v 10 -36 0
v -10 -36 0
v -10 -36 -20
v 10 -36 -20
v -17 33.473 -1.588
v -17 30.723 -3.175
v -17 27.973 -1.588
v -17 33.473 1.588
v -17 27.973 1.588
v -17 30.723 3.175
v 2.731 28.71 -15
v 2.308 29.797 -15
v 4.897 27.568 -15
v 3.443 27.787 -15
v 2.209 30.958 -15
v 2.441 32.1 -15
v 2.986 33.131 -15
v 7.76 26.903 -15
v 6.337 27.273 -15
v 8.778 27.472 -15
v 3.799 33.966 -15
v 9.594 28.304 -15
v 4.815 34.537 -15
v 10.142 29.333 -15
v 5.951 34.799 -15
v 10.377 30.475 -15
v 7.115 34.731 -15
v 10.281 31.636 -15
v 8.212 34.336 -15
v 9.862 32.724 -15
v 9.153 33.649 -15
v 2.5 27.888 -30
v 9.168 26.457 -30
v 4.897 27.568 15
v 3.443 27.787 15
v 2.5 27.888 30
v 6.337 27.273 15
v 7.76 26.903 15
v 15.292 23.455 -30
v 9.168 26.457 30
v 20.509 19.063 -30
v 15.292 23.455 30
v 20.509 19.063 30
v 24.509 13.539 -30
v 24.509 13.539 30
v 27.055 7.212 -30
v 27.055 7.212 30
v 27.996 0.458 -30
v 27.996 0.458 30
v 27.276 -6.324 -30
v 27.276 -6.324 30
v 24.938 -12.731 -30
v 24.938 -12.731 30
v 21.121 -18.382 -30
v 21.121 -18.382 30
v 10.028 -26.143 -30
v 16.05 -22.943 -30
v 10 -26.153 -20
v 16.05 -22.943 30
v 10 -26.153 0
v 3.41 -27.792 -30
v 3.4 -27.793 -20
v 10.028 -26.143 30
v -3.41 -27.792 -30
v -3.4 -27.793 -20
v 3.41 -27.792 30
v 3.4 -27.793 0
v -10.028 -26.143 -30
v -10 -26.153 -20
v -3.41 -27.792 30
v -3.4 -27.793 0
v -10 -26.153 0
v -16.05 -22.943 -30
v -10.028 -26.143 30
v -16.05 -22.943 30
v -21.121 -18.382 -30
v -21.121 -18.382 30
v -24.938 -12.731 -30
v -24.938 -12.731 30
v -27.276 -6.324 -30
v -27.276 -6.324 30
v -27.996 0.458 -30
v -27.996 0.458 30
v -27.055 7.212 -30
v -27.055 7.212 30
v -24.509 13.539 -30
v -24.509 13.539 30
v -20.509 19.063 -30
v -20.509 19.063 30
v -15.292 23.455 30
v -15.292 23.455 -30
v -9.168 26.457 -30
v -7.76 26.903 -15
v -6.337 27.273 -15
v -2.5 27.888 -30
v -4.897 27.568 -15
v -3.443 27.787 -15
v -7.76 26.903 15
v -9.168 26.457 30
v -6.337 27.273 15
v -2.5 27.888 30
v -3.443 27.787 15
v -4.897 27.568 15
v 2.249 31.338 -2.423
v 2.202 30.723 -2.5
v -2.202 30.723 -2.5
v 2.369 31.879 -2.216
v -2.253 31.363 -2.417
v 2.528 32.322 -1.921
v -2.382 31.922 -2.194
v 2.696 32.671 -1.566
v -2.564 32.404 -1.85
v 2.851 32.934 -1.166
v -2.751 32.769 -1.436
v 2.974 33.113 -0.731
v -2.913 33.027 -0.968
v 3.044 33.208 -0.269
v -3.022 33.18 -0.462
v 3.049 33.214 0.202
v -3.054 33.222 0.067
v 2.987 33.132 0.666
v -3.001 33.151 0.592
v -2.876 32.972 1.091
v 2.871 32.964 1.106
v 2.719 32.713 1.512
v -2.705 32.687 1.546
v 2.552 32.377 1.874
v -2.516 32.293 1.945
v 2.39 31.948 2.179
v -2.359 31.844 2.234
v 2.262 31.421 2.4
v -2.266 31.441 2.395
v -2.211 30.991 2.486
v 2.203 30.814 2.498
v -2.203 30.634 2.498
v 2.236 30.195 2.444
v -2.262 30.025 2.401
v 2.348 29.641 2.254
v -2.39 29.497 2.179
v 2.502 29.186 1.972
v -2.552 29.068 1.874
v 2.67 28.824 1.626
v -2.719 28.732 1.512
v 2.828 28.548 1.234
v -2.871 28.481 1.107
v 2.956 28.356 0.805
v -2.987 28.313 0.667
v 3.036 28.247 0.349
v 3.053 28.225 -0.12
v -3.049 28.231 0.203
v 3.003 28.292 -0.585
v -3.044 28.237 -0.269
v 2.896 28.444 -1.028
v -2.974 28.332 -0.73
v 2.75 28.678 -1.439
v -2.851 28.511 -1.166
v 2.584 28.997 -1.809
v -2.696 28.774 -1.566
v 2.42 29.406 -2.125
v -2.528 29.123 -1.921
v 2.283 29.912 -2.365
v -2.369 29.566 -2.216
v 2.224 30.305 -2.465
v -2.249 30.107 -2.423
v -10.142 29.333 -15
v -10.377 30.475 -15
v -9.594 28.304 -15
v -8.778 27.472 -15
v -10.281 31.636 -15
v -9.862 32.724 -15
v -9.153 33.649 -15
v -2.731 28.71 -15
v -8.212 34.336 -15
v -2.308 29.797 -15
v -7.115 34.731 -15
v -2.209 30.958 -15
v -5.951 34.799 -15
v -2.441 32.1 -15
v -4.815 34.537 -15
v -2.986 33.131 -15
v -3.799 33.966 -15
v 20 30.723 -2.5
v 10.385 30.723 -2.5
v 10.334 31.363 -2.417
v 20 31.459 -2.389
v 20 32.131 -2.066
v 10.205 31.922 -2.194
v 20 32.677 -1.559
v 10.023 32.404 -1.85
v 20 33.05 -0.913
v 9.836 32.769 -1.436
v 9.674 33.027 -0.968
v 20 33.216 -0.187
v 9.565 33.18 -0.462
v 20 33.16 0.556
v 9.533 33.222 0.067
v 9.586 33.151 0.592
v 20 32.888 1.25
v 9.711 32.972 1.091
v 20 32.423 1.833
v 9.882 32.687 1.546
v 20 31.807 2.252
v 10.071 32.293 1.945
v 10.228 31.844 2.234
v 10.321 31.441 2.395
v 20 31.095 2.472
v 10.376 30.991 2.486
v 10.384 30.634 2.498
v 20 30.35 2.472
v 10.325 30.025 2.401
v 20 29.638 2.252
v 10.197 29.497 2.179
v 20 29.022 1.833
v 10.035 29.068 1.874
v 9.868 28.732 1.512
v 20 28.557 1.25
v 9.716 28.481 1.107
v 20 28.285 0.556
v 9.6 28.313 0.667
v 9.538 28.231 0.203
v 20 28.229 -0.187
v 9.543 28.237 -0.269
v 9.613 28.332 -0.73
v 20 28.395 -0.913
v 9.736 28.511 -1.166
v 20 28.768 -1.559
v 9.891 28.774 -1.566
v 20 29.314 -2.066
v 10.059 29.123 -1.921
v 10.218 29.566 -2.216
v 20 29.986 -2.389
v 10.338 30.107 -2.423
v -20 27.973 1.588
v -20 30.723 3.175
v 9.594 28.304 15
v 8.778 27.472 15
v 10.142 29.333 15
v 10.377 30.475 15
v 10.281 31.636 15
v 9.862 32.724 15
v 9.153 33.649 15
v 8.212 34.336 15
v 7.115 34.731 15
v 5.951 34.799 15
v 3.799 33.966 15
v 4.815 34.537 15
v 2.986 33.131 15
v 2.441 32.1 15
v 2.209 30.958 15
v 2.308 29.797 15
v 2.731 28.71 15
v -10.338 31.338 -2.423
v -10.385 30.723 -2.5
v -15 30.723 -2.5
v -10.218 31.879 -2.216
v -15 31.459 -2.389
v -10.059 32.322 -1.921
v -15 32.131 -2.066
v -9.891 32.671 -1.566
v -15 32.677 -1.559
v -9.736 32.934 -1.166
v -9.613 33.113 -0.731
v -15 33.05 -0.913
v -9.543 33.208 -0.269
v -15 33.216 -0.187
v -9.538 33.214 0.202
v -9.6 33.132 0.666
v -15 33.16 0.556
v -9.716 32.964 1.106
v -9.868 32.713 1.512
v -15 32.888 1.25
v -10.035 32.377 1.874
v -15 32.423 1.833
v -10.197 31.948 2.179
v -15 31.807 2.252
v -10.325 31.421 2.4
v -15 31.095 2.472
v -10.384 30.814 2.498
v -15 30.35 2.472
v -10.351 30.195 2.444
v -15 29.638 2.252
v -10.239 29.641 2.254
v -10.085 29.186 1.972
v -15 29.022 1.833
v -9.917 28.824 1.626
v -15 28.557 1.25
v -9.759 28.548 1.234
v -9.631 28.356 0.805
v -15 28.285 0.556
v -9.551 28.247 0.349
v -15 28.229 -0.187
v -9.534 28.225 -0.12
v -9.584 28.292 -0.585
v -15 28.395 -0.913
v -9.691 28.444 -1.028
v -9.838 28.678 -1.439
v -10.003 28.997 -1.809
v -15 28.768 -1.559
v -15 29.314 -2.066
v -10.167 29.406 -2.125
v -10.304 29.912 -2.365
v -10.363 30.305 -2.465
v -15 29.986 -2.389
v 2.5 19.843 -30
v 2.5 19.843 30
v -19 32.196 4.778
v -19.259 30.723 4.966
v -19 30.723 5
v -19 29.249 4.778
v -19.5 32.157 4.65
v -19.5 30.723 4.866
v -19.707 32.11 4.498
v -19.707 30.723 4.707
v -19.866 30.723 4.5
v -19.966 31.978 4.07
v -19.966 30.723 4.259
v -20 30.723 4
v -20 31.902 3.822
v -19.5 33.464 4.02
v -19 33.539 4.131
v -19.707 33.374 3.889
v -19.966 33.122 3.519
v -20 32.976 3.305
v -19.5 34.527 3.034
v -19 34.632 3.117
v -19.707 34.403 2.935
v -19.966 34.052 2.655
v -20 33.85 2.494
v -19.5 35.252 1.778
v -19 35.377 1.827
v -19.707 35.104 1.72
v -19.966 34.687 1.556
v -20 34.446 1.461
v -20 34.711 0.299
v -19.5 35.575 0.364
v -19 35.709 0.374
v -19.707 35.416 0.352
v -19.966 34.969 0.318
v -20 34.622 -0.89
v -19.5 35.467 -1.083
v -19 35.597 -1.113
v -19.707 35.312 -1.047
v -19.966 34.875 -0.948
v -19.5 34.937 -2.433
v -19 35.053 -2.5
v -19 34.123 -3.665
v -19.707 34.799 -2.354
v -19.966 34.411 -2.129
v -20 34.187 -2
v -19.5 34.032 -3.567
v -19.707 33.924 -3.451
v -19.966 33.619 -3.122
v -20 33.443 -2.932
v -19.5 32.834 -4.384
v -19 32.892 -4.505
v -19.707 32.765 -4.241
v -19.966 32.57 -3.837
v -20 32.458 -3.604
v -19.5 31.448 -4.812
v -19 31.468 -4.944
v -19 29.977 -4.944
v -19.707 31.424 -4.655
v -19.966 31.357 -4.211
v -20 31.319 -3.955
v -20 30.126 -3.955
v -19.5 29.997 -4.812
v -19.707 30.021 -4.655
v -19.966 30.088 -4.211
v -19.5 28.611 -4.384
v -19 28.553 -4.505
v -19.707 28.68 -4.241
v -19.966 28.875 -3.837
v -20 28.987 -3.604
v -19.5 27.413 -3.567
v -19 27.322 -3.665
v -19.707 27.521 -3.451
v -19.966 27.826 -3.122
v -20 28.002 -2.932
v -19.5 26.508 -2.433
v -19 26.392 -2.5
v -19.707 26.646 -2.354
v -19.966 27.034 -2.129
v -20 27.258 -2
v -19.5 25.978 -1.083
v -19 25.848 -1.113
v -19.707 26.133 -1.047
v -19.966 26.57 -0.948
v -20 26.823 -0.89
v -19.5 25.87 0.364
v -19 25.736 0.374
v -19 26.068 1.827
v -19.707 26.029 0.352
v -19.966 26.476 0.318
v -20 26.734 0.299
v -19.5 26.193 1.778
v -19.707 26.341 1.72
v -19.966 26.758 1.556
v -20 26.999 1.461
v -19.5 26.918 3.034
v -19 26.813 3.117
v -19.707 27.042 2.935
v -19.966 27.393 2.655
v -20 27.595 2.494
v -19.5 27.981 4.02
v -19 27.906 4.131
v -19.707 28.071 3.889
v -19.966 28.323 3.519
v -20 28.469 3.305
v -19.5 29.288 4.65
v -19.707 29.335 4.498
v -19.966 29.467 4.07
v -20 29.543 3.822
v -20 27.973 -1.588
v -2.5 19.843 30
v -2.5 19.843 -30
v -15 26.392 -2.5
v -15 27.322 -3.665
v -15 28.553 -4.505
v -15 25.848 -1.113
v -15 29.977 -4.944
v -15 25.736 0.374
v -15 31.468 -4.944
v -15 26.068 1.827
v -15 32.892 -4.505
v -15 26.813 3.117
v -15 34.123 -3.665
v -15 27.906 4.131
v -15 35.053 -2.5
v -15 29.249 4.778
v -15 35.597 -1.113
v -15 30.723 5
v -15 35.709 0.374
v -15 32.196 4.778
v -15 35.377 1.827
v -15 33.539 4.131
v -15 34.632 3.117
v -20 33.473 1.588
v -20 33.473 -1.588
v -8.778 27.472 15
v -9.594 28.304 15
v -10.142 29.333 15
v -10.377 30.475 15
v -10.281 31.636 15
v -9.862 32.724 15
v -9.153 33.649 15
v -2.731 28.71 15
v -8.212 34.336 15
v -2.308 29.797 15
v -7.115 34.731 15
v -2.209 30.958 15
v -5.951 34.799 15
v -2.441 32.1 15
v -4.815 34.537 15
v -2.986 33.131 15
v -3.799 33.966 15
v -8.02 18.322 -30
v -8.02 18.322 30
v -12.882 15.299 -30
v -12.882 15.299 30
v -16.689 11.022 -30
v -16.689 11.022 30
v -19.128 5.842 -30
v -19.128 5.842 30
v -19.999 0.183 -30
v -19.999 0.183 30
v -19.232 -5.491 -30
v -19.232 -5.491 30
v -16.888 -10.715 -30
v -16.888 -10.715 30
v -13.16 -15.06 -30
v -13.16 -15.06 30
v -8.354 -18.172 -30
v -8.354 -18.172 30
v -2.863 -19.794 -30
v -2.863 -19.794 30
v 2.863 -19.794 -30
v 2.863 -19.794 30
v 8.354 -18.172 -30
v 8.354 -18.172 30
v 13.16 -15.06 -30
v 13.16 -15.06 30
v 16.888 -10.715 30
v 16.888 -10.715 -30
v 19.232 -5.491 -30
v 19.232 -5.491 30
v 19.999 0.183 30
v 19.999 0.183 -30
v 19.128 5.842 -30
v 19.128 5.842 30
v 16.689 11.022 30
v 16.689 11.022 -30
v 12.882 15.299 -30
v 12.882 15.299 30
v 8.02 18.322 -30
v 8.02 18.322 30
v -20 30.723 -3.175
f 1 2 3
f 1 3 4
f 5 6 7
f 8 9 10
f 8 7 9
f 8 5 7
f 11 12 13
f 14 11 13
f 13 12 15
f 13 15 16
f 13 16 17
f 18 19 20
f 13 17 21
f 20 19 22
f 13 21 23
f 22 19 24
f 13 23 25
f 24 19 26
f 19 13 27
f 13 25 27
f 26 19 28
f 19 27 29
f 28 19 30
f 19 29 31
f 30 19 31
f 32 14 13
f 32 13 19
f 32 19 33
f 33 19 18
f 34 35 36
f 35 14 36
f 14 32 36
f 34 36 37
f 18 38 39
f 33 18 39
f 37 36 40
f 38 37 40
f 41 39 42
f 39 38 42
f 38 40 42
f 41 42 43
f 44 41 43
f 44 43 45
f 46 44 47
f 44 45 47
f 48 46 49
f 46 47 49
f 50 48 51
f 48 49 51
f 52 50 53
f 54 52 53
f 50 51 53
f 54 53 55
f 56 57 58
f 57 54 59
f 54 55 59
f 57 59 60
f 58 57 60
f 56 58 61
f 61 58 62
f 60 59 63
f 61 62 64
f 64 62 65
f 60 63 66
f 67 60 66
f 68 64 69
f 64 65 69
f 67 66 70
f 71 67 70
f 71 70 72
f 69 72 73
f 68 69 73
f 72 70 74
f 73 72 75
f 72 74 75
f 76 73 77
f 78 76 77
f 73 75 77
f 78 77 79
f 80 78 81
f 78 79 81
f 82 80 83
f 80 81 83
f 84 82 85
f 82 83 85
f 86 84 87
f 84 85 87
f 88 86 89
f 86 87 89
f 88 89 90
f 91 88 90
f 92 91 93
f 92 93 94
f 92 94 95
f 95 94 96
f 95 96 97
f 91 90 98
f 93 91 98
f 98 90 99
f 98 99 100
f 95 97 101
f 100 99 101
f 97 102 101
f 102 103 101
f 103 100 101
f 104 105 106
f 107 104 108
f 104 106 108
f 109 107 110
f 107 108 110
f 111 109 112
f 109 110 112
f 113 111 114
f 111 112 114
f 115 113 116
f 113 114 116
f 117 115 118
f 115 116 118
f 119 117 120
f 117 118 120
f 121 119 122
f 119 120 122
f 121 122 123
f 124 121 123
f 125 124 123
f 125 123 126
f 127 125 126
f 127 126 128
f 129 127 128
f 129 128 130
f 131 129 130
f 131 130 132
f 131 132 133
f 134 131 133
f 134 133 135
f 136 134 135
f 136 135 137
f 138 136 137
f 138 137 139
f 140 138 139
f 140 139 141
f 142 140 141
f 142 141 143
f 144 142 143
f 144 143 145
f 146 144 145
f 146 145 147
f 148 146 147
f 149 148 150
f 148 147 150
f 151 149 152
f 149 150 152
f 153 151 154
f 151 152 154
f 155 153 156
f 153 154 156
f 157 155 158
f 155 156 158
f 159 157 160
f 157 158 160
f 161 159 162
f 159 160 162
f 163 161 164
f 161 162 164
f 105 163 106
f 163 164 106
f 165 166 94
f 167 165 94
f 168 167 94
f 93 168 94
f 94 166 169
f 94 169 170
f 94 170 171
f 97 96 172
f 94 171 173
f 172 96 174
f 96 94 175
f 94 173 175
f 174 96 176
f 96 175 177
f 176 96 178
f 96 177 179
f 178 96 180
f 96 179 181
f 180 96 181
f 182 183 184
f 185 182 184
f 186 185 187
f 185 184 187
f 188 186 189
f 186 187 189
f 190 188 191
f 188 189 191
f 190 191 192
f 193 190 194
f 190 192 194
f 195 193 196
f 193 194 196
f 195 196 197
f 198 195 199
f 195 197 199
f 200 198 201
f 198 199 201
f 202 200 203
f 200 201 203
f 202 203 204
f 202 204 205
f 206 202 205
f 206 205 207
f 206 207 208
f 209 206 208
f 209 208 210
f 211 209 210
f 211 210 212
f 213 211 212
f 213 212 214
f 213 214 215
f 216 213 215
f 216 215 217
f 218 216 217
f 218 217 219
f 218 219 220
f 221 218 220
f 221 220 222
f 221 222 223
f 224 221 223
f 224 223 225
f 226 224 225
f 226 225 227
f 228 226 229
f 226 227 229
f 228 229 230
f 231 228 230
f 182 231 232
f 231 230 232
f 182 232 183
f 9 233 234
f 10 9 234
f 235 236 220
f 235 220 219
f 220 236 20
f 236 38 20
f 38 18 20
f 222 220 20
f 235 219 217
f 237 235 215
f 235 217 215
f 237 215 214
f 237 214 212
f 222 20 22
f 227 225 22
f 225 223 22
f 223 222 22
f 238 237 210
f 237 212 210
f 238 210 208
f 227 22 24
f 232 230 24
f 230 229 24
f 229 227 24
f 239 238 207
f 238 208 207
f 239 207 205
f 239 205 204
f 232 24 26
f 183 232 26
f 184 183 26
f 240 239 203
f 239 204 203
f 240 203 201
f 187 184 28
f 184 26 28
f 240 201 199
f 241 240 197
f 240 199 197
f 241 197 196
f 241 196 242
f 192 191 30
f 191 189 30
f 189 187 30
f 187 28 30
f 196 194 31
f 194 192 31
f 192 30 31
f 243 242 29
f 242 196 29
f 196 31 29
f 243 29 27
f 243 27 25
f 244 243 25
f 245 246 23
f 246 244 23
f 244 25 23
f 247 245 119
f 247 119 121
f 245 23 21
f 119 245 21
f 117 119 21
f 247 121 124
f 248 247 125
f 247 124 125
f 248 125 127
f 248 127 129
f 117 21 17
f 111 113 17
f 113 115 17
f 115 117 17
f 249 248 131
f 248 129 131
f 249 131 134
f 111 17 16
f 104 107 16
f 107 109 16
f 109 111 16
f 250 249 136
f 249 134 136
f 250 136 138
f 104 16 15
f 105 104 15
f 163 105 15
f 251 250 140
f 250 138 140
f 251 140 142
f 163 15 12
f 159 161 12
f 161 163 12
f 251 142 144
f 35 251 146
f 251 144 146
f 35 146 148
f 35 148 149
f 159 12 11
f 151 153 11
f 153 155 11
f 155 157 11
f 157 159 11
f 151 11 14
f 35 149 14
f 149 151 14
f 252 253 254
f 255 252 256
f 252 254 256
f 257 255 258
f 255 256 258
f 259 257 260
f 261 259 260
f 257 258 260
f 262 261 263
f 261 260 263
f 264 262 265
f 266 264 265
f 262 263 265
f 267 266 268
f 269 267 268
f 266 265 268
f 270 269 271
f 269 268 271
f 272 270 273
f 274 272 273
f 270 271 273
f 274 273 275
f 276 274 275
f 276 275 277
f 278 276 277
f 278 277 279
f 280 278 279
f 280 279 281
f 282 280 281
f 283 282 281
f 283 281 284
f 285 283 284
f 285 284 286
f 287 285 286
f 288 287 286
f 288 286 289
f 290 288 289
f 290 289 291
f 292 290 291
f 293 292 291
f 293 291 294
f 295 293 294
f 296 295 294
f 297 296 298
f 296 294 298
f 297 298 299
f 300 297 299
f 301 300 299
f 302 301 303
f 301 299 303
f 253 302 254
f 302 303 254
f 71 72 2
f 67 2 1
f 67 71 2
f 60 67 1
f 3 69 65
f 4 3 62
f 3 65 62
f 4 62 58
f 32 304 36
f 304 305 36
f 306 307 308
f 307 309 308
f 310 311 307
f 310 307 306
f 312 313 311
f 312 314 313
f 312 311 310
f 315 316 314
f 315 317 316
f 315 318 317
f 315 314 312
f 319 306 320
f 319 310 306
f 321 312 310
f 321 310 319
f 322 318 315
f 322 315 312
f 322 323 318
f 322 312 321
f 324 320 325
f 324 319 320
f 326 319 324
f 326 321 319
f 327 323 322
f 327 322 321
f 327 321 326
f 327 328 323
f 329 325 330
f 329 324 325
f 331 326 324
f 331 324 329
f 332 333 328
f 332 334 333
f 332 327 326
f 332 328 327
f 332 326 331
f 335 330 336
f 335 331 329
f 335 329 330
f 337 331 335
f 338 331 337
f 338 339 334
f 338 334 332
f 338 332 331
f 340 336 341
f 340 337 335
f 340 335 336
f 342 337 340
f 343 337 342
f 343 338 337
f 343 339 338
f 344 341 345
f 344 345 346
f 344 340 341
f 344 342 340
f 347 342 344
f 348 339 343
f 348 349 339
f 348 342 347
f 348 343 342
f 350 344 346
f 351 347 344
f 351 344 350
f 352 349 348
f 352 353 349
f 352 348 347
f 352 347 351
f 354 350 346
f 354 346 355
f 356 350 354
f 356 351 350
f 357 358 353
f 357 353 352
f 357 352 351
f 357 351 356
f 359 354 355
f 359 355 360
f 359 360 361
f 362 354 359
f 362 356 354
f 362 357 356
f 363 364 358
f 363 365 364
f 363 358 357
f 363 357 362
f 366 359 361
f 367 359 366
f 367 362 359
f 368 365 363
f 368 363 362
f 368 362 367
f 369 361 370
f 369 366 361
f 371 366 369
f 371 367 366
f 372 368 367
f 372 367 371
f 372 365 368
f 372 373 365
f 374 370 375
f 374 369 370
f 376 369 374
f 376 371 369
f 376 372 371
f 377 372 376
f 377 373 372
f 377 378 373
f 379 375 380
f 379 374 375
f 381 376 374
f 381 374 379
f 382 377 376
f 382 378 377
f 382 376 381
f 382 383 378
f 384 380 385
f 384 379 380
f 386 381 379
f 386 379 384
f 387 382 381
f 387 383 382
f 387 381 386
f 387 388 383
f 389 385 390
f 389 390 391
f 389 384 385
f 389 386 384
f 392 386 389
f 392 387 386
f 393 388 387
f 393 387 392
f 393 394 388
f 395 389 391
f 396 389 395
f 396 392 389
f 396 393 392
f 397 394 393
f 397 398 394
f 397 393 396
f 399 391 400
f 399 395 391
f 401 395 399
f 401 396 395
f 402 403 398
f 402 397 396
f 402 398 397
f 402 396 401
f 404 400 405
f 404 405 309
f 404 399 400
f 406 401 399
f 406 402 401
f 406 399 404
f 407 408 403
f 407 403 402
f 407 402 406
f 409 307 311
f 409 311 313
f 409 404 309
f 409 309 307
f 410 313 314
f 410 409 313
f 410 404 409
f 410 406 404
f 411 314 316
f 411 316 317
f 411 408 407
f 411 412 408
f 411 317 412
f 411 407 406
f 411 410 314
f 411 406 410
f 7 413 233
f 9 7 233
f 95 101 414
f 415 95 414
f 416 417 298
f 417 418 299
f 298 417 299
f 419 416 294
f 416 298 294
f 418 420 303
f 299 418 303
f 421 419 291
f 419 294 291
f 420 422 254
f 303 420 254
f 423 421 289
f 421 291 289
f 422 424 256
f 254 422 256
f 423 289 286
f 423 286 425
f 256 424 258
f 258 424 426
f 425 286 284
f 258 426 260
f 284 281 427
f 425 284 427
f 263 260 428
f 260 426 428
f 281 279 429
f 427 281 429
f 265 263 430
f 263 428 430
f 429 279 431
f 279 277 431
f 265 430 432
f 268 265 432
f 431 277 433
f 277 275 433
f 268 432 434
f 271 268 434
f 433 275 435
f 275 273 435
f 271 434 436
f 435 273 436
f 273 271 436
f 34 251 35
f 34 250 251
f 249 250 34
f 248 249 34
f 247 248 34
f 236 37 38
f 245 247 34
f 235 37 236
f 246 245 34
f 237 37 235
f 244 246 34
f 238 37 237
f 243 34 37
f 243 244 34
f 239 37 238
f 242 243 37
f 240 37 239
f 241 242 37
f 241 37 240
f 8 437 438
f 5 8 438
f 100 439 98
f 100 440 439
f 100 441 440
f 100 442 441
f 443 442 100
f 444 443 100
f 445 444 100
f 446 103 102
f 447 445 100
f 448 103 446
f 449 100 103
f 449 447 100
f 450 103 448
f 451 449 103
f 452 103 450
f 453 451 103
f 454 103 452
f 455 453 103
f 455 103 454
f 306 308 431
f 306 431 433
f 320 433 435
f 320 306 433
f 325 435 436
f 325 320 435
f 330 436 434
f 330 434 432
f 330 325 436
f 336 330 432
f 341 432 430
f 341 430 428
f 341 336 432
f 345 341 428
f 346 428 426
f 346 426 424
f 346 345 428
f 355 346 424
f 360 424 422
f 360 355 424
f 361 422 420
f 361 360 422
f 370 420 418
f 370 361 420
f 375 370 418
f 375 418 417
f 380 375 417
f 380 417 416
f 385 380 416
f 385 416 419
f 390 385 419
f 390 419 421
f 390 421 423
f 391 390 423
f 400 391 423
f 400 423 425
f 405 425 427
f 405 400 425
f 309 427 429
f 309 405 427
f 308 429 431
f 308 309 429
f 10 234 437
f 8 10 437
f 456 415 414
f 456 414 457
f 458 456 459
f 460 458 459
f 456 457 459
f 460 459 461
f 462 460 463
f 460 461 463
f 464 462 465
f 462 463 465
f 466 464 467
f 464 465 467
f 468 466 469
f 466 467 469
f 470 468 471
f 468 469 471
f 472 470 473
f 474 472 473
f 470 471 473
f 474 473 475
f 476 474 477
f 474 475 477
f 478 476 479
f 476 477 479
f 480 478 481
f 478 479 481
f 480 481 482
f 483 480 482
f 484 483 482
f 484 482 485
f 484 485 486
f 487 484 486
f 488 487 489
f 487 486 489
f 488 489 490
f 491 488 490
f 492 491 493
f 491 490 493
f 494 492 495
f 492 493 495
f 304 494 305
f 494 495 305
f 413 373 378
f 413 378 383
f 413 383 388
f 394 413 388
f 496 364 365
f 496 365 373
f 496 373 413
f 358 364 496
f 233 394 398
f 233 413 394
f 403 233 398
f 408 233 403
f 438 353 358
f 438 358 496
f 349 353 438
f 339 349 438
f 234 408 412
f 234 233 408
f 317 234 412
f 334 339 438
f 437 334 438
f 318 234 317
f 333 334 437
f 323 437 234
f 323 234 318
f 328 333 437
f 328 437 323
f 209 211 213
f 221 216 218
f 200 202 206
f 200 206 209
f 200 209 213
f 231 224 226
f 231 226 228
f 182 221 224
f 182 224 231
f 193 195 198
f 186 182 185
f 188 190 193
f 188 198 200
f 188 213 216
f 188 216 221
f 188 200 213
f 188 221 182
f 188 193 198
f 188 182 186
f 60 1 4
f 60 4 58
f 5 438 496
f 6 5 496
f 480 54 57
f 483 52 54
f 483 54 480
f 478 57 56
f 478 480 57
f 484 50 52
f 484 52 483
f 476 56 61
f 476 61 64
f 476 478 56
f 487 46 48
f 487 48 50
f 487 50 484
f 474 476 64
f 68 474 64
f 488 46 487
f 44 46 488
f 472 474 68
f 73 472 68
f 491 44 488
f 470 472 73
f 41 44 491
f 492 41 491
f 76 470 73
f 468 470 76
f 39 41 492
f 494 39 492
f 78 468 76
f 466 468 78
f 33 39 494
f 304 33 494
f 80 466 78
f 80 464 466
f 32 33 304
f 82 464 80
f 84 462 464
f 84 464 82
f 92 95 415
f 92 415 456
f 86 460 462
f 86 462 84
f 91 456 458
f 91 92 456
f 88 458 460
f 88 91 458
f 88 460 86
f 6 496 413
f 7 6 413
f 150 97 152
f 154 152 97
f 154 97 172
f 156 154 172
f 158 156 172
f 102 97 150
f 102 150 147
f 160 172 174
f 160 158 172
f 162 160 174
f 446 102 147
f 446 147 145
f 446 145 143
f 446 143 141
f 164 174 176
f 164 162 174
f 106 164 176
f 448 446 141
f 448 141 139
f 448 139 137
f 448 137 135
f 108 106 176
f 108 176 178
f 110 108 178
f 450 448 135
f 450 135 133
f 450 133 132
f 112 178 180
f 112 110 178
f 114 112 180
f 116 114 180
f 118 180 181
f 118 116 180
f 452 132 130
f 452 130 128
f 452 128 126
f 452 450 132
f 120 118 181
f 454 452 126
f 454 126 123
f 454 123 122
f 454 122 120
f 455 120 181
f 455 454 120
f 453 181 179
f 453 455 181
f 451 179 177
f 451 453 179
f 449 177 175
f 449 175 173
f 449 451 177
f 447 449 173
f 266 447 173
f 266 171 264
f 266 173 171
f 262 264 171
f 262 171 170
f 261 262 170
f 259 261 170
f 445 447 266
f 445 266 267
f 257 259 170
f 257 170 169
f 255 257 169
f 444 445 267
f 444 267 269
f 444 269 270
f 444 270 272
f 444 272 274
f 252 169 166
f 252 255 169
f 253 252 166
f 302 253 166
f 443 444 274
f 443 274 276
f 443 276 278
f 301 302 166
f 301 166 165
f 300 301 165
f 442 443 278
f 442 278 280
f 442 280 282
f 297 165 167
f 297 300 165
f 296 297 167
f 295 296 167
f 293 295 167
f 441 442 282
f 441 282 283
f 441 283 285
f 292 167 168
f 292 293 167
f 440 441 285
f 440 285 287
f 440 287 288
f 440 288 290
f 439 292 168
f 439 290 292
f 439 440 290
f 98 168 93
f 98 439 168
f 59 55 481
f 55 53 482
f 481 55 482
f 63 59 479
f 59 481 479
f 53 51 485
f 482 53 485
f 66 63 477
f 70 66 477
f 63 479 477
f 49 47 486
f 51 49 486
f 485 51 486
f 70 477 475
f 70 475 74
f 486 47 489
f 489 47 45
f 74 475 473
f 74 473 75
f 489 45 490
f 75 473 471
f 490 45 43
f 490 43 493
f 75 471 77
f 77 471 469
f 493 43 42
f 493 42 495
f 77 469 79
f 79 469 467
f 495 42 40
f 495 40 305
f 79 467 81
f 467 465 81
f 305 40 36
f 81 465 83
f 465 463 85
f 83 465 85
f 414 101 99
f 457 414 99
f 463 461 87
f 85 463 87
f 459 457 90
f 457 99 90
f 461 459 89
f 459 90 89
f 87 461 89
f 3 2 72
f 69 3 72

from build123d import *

# Parameters (mm, degrees)
BOSS_EXTRUDE1_DEPTH      = 30
SKETCH2_R                = 4.091242679
BOSS_EXTRUDE2_DEPTH      = 15
SKETCH3_W                = 20
SKETCH3_H                = 12.982921918
BOSS_EXTRUDE3_DEPTH      = 20
BOSS_EXTRUDE5_DEPTH      = 20
BOSS_EXTRUDE5_DEPTH_BACK = 20
SKETCH5_R                = 2.5
SKETCH6_R                = 5
BOSS_EXTRUDE6_DEPTH      = 5
CUT_EXTRUDE1_DEPTH       = 3
FILLET2_R                = 1


with BuildPart() as part:
    # Sketch1 → Boss-Extrude1 (new, symmetric)
    with BuildSketch(Plane.XY):
        with BuildLine():
            Line((-2.5, 27.888169535), (-2.5, 19.843134833))
            ThreePointArc((-2.5, 19.843134833), (0, -20), (2.5, 19.843134833))
            Line((2.5, 19.843134833), (2.5, 27.888169535))
            ThreePointArc((2.5, 27.888169535), (0, -28), (-2.5, 27.888169535))
        make_face()
    extrude(amount=BOSS_EXTRUDE1_DEPTH, both=True)

    # Sketch2 → Boss-Extrude2 (add, symmetric)
    with BuildSketch(Plane.XY):
        with Locations((6.293533022, 30.722501857)):
            Circle(SKETCH2_R)
        with Locations((-6.293533022, 30.722501857)):
            Circle(SKETCH2_R)
    extrude(amount=BOSS_EXTRUDE2_DEPTH, both=True)

    # Sketch3 → Boss-Extrude3 (add)
    with BuildSketch(Plane.XY):
        with Locations((0, -29.508539041)):
            Rectangle(SKETCH3_W, SKETCH3_H)
    extrude(amount=-BOSS_EXTRUDE3_DEPTH)

    # Sketch5 → Boss-Extrude5 (add, two sides: drawn at the far end of the back side and taken through both)
    with BuildSketch(Plane(origin=(0, 0, 0), x_dir=(0, 0, -1), z_dir=(1, 0, 0)).offset(-BOSS_EXTRUDE5_DEPTH_BACK)):
        with Locations((0, 30.722501857)):
            Circle(SKETCH5_R)
    extrude(amount=BOSS_EXTRUDE5_DEPTH + BOSS_EXTRUDE5_DEPTH_BACK)

    # Sketch6 → Boss-Extrude6 (add)
    with BuildSketch(Plane.ZY.offset(20)):
        with Locations((0, 30.722501857)):
            Circle(SKETCH6_R)
    extrude(amount=-BOSS_EXTRUDE6_DEPTH)

    # Sketch7 → Cut-Extrude1 (cut)
    with BuildSketch(Plane.ZY.offset(20)):
        Polygon((1.58771324, 27.972501857), (3.175426481, 30.722501857), (1.58771324, 33.472501857), (-1.58771324, 33.472501857), (-3.175426481, 30.722501857), (-1.58771324, 27.972501857), align=None)
    extrude(amount=-CUT_EXTRUDE1_DEPTH, mode=Mode.SUBTRACT)

    # Fillet2
    fillet2_edges = [part.edges().sort_by_distance(p)[0] for p in [
        (-20, 30.722501857, -5),
    ]]
    fillet(fillet2_edges, radius=FILLET2_R)


solid = part.part
